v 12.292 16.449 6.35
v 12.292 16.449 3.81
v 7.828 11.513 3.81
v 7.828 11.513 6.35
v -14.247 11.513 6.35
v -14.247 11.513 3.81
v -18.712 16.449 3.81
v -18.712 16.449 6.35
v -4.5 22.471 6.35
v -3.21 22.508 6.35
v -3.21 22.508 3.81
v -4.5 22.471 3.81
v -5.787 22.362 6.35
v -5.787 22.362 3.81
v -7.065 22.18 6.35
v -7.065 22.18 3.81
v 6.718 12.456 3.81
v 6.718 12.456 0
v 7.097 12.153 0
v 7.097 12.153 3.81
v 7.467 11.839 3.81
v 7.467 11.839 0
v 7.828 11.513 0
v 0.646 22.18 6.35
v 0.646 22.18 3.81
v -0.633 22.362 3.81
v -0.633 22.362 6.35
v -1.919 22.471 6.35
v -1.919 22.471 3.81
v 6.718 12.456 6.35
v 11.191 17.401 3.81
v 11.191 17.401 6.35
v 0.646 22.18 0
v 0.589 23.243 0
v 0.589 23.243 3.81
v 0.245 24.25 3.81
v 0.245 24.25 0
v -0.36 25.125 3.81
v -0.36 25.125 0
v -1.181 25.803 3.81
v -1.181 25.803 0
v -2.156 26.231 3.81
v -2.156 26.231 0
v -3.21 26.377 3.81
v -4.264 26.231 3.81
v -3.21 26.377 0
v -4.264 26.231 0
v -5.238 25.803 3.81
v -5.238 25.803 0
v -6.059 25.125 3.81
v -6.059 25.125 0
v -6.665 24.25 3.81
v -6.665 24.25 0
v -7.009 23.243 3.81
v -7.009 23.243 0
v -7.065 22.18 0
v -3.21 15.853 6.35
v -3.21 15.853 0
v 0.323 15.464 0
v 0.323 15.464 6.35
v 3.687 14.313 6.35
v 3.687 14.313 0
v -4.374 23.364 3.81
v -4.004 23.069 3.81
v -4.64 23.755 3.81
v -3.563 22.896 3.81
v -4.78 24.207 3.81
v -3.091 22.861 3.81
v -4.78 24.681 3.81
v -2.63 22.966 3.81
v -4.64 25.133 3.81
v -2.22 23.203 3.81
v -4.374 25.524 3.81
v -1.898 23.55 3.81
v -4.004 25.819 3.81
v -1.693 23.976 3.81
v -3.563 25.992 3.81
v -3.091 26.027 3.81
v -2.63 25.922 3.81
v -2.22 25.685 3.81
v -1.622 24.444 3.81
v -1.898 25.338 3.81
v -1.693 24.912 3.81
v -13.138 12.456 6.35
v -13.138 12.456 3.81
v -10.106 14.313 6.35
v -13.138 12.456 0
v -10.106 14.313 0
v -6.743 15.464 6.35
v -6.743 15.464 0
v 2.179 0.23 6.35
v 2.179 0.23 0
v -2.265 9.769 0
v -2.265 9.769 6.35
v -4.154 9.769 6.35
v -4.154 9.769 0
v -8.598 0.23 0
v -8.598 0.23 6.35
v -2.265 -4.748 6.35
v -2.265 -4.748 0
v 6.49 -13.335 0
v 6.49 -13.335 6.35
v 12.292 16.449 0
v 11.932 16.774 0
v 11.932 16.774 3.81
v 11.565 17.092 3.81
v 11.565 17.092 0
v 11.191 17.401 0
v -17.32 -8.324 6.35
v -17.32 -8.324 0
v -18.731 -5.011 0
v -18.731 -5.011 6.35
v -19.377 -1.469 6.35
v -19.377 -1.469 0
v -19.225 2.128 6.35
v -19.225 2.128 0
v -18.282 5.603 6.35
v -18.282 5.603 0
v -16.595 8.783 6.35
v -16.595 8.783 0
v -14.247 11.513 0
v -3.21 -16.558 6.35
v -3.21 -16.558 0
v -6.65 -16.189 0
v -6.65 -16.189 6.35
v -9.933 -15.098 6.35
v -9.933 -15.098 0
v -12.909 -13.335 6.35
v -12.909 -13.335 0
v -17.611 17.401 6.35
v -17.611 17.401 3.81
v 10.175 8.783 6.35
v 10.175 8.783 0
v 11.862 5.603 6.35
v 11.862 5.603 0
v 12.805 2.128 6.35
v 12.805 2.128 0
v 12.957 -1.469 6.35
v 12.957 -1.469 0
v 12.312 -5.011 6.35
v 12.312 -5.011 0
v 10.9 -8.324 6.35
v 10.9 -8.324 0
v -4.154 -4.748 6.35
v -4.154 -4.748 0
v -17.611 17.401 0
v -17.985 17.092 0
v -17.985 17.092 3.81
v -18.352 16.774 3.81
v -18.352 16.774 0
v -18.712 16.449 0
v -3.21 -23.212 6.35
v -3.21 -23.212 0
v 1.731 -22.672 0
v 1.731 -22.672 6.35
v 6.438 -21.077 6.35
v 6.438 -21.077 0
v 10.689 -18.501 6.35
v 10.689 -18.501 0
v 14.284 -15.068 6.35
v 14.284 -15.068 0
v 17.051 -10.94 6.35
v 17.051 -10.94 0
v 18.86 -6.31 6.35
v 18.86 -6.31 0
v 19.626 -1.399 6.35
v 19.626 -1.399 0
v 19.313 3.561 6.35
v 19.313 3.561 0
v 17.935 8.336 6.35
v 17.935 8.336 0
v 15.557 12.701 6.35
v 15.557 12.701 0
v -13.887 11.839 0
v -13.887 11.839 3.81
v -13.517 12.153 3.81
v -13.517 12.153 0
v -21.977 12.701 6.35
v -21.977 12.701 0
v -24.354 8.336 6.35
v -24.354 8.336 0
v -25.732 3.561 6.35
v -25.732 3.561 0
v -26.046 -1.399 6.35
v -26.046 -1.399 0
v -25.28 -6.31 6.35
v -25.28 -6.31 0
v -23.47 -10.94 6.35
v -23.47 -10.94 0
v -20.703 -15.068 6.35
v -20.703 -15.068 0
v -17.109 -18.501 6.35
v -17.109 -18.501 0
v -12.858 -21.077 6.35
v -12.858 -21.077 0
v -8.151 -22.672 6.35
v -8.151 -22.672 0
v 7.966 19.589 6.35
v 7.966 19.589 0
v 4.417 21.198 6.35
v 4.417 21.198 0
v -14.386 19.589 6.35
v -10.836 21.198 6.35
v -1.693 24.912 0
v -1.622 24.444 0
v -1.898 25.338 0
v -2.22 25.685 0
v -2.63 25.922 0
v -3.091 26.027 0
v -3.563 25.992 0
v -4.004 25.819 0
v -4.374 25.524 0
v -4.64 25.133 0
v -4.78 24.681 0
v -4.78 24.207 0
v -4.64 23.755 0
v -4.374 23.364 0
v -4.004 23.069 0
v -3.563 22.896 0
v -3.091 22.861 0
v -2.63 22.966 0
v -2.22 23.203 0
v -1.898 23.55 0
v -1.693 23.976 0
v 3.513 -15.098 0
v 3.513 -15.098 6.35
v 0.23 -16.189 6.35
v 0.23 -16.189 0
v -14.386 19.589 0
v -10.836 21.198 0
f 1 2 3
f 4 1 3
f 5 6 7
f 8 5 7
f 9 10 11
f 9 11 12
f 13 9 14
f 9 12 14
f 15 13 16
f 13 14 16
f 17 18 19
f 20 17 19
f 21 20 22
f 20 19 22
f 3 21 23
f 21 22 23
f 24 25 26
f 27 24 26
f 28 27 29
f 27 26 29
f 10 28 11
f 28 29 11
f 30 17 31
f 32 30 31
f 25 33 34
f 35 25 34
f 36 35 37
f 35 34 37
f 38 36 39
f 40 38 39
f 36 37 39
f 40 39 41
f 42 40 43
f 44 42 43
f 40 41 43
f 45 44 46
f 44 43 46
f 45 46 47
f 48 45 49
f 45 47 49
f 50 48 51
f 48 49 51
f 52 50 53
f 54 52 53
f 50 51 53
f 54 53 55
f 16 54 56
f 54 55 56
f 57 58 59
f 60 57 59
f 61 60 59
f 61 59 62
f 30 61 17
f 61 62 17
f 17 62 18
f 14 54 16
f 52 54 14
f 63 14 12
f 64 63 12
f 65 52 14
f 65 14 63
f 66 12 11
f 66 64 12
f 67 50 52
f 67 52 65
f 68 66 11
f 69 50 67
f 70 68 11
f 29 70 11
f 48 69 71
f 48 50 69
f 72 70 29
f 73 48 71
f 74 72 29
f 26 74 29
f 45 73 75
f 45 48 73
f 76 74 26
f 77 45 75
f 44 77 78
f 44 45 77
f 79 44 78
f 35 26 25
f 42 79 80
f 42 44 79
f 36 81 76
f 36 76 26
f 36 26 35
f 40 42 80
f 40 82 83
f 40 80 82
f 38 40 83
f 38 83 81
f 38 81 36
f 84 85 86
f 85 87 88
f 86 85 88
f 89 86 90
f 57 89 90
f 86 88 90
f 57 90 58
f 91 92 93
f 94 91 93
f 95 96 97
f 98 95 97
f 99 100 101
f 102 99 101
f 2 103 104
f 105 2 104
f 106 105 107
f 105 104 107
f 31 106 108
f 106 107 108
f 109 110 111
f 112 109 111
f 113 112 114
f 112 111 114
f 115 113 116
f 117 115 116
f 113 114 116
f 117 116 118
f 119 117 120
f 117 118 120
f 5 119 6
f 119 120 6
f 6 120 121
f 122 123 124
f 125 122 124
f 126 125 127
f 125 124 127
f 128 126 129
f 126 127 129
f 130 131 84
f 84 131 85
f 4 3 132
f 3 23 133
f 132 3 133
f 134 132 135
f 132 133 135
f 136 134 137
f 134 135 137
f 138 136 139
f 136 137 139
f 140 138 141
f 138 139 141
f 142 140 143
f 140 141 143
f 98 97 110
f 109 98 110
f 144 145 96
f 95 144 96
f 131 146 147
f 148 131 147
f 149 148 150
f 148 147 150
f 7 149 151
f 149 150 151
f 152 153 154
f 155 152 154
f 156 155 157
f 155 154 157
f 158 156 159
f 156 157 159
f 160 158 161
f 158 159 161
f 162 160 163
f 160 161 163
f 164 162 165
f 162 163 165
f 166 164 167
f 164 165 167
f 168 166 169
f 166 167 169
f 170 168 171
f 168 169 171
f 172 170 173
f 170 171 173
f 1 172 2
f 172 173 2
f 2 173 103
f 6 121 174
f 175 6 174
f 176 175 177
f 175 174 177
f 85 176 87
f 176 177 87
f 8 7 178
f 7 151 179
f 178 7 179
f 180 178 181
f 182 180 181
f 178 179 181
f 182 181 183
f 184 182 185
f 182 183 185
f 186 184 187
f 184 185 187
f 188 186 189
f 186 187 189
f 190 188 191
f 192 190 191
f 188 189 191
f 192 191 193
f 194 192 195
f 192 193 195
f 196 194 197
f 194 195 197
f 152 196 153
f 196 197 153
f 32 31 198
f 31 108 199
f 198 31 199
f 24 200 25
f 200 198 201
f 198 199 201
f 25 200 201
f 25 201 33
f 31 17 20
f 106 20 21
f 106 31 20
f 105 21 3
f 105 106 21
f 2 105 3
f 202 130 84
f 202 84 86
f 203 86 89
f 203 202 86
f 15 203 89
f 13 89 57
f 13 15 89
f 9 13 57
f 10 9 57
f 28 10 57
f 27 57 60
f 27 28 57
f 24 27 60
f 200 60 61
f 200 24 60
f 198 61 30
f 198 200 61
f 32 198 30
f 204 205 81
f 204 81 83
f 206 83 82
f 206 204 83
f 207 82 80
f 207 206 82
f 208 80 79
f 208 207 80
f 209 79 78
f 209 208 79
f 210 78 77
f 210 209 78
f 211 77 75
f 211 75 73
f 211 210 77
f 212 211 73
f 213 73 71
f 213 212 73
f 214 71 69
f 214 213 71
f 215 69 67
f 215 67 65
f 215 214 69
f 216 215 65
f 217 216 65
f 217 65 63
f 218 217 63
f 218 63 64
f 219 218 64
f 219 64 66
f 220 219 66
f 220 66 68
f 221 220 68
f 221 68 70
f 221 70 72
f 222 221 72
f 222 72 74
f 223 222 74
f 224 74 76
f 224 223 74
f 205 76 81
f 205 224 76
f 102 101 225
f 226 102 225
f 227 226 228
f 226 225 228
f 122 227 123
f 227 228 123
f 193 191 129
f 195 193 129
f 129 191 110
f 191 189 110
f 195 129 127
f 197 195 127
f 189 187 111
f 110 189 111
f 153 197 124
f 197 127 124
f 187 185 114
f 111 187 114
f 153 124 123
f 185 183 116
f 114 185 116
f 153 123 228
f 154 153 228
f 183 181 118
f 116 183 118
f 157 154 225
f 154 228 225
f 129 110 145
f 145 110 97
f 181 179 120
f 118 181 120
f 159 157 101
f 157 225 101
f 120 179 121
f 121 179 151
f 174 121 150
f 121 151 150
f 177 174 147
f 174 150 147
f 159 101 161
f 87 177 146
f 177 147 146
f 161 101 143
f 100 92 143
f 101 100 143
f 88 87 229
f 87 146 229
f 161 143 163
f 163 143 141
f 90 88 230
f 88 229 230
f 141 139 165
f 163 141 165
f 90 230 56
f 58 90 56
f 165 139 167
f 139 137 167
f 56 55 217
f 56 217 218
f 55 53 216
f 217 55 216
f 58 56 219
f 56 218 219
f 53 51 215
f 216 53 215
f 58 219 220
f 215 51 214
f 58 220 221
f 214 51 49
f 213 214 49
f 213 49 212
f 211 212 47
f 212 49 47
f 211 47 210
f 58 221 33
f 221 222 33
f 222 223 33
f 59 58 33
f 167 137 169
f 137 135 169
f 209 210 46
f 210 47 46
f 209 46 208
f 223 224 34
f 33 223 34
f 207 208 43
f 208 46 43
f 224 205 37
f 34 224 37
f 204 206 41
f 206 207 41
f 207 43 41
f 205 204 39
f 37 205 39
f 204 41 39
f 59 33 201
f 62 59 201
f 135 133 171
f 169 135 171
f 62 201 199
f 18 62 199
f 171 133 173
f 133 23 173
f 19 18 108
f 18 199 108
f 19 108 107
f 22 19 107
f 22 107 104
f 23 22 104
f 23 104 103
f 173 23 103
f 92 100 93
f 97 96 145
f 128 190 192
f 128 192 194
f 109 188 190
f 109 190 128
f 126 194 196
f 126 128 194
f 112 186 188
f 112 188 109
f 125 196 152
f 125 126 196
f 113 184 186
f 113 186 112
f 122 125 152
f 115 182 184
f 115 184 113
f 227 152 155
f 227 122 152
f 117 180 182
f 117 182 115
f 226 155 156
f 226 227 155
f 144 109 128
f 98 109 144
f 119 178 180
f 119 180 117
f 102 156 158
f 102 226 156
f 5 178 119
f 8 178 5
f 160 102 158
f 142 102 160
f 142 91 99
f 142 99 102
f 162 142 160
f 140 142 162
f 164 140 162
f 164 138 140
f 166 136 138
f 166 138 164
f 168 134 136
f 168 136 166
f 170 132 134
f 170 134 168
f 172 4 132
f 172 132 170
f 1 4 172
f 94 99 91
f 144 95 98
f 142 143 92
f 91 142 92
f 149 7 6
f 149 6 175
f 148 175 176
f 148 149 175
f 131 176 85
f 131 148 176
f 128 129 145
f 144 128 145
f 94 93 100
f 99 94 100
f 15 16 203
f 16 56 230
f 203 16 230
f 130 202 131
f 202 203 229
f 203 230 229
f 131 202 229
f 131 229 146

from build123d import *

# Parameters (mm, degrees)
F1_DEPTH = 6.35
F0_R     = 1.5875
F2_DEPTH = 3.81


with BuildPart() as f1:
    # F0 (on Top) → F1 (new body)
    with BuildSketch(Plane.XY):
        with BuildLine():
            ThreePointArc((0.645552, 22.180257), (-1.275182, 22.425696), (-3.209795, 22.507705))
            ThreePointArc((-3.209795, 22.507705), (-5.144409, 22.425696), (-7.065142, 22.180257))
            ThreePointArc((-7.065142, 22.180257), (-12.645539, 20.469481), (-17.610809, 17.401308))
            Line((-17.610809, 17.401308), (-13.137701, 12.456375))
            ThreePointArc((-13.137701, 12.456375), (-8.4563, 14.980661), (-3.209795, 15.853424))
            ThreePointArc((-3.209795, 15.853424), (2.03671, 14.980661), (6.71811, 12.456375))
            Line((6.71811, 12.456375), (11.191218, 17.401308))
            ThreePointArc((11.191218, 17.401308), (6.225949, 20.469481), (0.645552, 22.180257))
        make_face()
        with BuildLine():
            Line((-14.247476, 11.51341), (-18.711746, 16.448572))
            ThreePointArc((-18.711746, 16.448572), (-24.501195, -8.674307), (-3.209795, -23.212295))
            ThreePointArc((-3.209795, -23.212295), (18.081605, -8.674307), (12.292155, 16.448572))
            Line((12.292155, 16.448572), (7.827885, 11.51341))
            ThreePointArc((7.827885, 11.51341), (12.805017, 2.127855), (10.899951, -8.323519))
            Line((10.899951, -8.323519), (2.17881, 0.229518))
            Line((2.17881, 0.229518), (-2.26534, 9.769376))
            Line((-2.26534, 9.769376), (-2.26534, -4.748298))
            Line((-2.26534, -4.748298), (6.48982, -13.334699))
            ThreePointArc((6.48982, -13.334699), (1.900789, -15.731088), (-3.209795, -16.558014))
            ThreePointArc((-3.209795, -16.558014), (-8.32038, -15.731088), (-12.90941, -13.334699))
            Line((-12.90941, -13.334699), (-4.154251, -4.748298))
            Line((-4.154251, -4.748298), (-4.154251, 9.769376))
            Line((-4.154251, 9.769376), (-8.5984, 0.229518))
            Line((-8.5984, 0.229518), (-17.319541, -8.323519))
            ThreePointArc((-17.319541, -8.323519), (-19.224607, 2.127855), (-14.247476, 11.51341))
        make_face()
    extrude(amount=F1_DEPTH)

    # F0 (on Top) → F2 (join)
    with BuildSketch(Plane.XY):
        with BuildLine():
            ThreePointArc((-7.065142, 22.180257), (-5.144409, 22.425696), (-3.209795, 22.507705))
            ThreePointArc((-3.209795, 22.507705), (-1.275182, 22.425696), (0.645552, 22.180257))
            ThreePointArc((0.645552, 22.180257), (-3.209795, 26.376933), (-7.065142, 22.180257))
        make_face()
        with Locations((-3.209795, 24.443971)):
            Circle(F0_R, mode=Mode.SUBTRACT)
        with BuildLine():
            ThreePointArc((12.292155, 16.448572), (11.749274, 16.933707), (11.191218, 17.401308))
            Line((11.191218, 17.401308), (6.71811, 12.456375))
            ThreePointArc((6.71811, 12.456375), (7.283595, 11.997365), (7.827885, 11.51341))
            Line((7.827885, 11.51341), (12.292155, 16.448572))
        make_face()
        with BuildLine():
            Line((-13.137701, 12.456375), (-17.610809, 17.401308))
            ThreePointArc((-17.610809, 17.401308), (-18.168864, 16.933707), (-18.711746, 16.448572))
            Line((-18.711746, 16.448572), (-14.247476, 11.51341))
            ThreePointArc((-14.247476, 11.51341), (-13.703186, 11.997365), (-13.137701, 12.456375))
        make_face()
    extrude(amount=F2_DEPTH)


solid = f1.part
